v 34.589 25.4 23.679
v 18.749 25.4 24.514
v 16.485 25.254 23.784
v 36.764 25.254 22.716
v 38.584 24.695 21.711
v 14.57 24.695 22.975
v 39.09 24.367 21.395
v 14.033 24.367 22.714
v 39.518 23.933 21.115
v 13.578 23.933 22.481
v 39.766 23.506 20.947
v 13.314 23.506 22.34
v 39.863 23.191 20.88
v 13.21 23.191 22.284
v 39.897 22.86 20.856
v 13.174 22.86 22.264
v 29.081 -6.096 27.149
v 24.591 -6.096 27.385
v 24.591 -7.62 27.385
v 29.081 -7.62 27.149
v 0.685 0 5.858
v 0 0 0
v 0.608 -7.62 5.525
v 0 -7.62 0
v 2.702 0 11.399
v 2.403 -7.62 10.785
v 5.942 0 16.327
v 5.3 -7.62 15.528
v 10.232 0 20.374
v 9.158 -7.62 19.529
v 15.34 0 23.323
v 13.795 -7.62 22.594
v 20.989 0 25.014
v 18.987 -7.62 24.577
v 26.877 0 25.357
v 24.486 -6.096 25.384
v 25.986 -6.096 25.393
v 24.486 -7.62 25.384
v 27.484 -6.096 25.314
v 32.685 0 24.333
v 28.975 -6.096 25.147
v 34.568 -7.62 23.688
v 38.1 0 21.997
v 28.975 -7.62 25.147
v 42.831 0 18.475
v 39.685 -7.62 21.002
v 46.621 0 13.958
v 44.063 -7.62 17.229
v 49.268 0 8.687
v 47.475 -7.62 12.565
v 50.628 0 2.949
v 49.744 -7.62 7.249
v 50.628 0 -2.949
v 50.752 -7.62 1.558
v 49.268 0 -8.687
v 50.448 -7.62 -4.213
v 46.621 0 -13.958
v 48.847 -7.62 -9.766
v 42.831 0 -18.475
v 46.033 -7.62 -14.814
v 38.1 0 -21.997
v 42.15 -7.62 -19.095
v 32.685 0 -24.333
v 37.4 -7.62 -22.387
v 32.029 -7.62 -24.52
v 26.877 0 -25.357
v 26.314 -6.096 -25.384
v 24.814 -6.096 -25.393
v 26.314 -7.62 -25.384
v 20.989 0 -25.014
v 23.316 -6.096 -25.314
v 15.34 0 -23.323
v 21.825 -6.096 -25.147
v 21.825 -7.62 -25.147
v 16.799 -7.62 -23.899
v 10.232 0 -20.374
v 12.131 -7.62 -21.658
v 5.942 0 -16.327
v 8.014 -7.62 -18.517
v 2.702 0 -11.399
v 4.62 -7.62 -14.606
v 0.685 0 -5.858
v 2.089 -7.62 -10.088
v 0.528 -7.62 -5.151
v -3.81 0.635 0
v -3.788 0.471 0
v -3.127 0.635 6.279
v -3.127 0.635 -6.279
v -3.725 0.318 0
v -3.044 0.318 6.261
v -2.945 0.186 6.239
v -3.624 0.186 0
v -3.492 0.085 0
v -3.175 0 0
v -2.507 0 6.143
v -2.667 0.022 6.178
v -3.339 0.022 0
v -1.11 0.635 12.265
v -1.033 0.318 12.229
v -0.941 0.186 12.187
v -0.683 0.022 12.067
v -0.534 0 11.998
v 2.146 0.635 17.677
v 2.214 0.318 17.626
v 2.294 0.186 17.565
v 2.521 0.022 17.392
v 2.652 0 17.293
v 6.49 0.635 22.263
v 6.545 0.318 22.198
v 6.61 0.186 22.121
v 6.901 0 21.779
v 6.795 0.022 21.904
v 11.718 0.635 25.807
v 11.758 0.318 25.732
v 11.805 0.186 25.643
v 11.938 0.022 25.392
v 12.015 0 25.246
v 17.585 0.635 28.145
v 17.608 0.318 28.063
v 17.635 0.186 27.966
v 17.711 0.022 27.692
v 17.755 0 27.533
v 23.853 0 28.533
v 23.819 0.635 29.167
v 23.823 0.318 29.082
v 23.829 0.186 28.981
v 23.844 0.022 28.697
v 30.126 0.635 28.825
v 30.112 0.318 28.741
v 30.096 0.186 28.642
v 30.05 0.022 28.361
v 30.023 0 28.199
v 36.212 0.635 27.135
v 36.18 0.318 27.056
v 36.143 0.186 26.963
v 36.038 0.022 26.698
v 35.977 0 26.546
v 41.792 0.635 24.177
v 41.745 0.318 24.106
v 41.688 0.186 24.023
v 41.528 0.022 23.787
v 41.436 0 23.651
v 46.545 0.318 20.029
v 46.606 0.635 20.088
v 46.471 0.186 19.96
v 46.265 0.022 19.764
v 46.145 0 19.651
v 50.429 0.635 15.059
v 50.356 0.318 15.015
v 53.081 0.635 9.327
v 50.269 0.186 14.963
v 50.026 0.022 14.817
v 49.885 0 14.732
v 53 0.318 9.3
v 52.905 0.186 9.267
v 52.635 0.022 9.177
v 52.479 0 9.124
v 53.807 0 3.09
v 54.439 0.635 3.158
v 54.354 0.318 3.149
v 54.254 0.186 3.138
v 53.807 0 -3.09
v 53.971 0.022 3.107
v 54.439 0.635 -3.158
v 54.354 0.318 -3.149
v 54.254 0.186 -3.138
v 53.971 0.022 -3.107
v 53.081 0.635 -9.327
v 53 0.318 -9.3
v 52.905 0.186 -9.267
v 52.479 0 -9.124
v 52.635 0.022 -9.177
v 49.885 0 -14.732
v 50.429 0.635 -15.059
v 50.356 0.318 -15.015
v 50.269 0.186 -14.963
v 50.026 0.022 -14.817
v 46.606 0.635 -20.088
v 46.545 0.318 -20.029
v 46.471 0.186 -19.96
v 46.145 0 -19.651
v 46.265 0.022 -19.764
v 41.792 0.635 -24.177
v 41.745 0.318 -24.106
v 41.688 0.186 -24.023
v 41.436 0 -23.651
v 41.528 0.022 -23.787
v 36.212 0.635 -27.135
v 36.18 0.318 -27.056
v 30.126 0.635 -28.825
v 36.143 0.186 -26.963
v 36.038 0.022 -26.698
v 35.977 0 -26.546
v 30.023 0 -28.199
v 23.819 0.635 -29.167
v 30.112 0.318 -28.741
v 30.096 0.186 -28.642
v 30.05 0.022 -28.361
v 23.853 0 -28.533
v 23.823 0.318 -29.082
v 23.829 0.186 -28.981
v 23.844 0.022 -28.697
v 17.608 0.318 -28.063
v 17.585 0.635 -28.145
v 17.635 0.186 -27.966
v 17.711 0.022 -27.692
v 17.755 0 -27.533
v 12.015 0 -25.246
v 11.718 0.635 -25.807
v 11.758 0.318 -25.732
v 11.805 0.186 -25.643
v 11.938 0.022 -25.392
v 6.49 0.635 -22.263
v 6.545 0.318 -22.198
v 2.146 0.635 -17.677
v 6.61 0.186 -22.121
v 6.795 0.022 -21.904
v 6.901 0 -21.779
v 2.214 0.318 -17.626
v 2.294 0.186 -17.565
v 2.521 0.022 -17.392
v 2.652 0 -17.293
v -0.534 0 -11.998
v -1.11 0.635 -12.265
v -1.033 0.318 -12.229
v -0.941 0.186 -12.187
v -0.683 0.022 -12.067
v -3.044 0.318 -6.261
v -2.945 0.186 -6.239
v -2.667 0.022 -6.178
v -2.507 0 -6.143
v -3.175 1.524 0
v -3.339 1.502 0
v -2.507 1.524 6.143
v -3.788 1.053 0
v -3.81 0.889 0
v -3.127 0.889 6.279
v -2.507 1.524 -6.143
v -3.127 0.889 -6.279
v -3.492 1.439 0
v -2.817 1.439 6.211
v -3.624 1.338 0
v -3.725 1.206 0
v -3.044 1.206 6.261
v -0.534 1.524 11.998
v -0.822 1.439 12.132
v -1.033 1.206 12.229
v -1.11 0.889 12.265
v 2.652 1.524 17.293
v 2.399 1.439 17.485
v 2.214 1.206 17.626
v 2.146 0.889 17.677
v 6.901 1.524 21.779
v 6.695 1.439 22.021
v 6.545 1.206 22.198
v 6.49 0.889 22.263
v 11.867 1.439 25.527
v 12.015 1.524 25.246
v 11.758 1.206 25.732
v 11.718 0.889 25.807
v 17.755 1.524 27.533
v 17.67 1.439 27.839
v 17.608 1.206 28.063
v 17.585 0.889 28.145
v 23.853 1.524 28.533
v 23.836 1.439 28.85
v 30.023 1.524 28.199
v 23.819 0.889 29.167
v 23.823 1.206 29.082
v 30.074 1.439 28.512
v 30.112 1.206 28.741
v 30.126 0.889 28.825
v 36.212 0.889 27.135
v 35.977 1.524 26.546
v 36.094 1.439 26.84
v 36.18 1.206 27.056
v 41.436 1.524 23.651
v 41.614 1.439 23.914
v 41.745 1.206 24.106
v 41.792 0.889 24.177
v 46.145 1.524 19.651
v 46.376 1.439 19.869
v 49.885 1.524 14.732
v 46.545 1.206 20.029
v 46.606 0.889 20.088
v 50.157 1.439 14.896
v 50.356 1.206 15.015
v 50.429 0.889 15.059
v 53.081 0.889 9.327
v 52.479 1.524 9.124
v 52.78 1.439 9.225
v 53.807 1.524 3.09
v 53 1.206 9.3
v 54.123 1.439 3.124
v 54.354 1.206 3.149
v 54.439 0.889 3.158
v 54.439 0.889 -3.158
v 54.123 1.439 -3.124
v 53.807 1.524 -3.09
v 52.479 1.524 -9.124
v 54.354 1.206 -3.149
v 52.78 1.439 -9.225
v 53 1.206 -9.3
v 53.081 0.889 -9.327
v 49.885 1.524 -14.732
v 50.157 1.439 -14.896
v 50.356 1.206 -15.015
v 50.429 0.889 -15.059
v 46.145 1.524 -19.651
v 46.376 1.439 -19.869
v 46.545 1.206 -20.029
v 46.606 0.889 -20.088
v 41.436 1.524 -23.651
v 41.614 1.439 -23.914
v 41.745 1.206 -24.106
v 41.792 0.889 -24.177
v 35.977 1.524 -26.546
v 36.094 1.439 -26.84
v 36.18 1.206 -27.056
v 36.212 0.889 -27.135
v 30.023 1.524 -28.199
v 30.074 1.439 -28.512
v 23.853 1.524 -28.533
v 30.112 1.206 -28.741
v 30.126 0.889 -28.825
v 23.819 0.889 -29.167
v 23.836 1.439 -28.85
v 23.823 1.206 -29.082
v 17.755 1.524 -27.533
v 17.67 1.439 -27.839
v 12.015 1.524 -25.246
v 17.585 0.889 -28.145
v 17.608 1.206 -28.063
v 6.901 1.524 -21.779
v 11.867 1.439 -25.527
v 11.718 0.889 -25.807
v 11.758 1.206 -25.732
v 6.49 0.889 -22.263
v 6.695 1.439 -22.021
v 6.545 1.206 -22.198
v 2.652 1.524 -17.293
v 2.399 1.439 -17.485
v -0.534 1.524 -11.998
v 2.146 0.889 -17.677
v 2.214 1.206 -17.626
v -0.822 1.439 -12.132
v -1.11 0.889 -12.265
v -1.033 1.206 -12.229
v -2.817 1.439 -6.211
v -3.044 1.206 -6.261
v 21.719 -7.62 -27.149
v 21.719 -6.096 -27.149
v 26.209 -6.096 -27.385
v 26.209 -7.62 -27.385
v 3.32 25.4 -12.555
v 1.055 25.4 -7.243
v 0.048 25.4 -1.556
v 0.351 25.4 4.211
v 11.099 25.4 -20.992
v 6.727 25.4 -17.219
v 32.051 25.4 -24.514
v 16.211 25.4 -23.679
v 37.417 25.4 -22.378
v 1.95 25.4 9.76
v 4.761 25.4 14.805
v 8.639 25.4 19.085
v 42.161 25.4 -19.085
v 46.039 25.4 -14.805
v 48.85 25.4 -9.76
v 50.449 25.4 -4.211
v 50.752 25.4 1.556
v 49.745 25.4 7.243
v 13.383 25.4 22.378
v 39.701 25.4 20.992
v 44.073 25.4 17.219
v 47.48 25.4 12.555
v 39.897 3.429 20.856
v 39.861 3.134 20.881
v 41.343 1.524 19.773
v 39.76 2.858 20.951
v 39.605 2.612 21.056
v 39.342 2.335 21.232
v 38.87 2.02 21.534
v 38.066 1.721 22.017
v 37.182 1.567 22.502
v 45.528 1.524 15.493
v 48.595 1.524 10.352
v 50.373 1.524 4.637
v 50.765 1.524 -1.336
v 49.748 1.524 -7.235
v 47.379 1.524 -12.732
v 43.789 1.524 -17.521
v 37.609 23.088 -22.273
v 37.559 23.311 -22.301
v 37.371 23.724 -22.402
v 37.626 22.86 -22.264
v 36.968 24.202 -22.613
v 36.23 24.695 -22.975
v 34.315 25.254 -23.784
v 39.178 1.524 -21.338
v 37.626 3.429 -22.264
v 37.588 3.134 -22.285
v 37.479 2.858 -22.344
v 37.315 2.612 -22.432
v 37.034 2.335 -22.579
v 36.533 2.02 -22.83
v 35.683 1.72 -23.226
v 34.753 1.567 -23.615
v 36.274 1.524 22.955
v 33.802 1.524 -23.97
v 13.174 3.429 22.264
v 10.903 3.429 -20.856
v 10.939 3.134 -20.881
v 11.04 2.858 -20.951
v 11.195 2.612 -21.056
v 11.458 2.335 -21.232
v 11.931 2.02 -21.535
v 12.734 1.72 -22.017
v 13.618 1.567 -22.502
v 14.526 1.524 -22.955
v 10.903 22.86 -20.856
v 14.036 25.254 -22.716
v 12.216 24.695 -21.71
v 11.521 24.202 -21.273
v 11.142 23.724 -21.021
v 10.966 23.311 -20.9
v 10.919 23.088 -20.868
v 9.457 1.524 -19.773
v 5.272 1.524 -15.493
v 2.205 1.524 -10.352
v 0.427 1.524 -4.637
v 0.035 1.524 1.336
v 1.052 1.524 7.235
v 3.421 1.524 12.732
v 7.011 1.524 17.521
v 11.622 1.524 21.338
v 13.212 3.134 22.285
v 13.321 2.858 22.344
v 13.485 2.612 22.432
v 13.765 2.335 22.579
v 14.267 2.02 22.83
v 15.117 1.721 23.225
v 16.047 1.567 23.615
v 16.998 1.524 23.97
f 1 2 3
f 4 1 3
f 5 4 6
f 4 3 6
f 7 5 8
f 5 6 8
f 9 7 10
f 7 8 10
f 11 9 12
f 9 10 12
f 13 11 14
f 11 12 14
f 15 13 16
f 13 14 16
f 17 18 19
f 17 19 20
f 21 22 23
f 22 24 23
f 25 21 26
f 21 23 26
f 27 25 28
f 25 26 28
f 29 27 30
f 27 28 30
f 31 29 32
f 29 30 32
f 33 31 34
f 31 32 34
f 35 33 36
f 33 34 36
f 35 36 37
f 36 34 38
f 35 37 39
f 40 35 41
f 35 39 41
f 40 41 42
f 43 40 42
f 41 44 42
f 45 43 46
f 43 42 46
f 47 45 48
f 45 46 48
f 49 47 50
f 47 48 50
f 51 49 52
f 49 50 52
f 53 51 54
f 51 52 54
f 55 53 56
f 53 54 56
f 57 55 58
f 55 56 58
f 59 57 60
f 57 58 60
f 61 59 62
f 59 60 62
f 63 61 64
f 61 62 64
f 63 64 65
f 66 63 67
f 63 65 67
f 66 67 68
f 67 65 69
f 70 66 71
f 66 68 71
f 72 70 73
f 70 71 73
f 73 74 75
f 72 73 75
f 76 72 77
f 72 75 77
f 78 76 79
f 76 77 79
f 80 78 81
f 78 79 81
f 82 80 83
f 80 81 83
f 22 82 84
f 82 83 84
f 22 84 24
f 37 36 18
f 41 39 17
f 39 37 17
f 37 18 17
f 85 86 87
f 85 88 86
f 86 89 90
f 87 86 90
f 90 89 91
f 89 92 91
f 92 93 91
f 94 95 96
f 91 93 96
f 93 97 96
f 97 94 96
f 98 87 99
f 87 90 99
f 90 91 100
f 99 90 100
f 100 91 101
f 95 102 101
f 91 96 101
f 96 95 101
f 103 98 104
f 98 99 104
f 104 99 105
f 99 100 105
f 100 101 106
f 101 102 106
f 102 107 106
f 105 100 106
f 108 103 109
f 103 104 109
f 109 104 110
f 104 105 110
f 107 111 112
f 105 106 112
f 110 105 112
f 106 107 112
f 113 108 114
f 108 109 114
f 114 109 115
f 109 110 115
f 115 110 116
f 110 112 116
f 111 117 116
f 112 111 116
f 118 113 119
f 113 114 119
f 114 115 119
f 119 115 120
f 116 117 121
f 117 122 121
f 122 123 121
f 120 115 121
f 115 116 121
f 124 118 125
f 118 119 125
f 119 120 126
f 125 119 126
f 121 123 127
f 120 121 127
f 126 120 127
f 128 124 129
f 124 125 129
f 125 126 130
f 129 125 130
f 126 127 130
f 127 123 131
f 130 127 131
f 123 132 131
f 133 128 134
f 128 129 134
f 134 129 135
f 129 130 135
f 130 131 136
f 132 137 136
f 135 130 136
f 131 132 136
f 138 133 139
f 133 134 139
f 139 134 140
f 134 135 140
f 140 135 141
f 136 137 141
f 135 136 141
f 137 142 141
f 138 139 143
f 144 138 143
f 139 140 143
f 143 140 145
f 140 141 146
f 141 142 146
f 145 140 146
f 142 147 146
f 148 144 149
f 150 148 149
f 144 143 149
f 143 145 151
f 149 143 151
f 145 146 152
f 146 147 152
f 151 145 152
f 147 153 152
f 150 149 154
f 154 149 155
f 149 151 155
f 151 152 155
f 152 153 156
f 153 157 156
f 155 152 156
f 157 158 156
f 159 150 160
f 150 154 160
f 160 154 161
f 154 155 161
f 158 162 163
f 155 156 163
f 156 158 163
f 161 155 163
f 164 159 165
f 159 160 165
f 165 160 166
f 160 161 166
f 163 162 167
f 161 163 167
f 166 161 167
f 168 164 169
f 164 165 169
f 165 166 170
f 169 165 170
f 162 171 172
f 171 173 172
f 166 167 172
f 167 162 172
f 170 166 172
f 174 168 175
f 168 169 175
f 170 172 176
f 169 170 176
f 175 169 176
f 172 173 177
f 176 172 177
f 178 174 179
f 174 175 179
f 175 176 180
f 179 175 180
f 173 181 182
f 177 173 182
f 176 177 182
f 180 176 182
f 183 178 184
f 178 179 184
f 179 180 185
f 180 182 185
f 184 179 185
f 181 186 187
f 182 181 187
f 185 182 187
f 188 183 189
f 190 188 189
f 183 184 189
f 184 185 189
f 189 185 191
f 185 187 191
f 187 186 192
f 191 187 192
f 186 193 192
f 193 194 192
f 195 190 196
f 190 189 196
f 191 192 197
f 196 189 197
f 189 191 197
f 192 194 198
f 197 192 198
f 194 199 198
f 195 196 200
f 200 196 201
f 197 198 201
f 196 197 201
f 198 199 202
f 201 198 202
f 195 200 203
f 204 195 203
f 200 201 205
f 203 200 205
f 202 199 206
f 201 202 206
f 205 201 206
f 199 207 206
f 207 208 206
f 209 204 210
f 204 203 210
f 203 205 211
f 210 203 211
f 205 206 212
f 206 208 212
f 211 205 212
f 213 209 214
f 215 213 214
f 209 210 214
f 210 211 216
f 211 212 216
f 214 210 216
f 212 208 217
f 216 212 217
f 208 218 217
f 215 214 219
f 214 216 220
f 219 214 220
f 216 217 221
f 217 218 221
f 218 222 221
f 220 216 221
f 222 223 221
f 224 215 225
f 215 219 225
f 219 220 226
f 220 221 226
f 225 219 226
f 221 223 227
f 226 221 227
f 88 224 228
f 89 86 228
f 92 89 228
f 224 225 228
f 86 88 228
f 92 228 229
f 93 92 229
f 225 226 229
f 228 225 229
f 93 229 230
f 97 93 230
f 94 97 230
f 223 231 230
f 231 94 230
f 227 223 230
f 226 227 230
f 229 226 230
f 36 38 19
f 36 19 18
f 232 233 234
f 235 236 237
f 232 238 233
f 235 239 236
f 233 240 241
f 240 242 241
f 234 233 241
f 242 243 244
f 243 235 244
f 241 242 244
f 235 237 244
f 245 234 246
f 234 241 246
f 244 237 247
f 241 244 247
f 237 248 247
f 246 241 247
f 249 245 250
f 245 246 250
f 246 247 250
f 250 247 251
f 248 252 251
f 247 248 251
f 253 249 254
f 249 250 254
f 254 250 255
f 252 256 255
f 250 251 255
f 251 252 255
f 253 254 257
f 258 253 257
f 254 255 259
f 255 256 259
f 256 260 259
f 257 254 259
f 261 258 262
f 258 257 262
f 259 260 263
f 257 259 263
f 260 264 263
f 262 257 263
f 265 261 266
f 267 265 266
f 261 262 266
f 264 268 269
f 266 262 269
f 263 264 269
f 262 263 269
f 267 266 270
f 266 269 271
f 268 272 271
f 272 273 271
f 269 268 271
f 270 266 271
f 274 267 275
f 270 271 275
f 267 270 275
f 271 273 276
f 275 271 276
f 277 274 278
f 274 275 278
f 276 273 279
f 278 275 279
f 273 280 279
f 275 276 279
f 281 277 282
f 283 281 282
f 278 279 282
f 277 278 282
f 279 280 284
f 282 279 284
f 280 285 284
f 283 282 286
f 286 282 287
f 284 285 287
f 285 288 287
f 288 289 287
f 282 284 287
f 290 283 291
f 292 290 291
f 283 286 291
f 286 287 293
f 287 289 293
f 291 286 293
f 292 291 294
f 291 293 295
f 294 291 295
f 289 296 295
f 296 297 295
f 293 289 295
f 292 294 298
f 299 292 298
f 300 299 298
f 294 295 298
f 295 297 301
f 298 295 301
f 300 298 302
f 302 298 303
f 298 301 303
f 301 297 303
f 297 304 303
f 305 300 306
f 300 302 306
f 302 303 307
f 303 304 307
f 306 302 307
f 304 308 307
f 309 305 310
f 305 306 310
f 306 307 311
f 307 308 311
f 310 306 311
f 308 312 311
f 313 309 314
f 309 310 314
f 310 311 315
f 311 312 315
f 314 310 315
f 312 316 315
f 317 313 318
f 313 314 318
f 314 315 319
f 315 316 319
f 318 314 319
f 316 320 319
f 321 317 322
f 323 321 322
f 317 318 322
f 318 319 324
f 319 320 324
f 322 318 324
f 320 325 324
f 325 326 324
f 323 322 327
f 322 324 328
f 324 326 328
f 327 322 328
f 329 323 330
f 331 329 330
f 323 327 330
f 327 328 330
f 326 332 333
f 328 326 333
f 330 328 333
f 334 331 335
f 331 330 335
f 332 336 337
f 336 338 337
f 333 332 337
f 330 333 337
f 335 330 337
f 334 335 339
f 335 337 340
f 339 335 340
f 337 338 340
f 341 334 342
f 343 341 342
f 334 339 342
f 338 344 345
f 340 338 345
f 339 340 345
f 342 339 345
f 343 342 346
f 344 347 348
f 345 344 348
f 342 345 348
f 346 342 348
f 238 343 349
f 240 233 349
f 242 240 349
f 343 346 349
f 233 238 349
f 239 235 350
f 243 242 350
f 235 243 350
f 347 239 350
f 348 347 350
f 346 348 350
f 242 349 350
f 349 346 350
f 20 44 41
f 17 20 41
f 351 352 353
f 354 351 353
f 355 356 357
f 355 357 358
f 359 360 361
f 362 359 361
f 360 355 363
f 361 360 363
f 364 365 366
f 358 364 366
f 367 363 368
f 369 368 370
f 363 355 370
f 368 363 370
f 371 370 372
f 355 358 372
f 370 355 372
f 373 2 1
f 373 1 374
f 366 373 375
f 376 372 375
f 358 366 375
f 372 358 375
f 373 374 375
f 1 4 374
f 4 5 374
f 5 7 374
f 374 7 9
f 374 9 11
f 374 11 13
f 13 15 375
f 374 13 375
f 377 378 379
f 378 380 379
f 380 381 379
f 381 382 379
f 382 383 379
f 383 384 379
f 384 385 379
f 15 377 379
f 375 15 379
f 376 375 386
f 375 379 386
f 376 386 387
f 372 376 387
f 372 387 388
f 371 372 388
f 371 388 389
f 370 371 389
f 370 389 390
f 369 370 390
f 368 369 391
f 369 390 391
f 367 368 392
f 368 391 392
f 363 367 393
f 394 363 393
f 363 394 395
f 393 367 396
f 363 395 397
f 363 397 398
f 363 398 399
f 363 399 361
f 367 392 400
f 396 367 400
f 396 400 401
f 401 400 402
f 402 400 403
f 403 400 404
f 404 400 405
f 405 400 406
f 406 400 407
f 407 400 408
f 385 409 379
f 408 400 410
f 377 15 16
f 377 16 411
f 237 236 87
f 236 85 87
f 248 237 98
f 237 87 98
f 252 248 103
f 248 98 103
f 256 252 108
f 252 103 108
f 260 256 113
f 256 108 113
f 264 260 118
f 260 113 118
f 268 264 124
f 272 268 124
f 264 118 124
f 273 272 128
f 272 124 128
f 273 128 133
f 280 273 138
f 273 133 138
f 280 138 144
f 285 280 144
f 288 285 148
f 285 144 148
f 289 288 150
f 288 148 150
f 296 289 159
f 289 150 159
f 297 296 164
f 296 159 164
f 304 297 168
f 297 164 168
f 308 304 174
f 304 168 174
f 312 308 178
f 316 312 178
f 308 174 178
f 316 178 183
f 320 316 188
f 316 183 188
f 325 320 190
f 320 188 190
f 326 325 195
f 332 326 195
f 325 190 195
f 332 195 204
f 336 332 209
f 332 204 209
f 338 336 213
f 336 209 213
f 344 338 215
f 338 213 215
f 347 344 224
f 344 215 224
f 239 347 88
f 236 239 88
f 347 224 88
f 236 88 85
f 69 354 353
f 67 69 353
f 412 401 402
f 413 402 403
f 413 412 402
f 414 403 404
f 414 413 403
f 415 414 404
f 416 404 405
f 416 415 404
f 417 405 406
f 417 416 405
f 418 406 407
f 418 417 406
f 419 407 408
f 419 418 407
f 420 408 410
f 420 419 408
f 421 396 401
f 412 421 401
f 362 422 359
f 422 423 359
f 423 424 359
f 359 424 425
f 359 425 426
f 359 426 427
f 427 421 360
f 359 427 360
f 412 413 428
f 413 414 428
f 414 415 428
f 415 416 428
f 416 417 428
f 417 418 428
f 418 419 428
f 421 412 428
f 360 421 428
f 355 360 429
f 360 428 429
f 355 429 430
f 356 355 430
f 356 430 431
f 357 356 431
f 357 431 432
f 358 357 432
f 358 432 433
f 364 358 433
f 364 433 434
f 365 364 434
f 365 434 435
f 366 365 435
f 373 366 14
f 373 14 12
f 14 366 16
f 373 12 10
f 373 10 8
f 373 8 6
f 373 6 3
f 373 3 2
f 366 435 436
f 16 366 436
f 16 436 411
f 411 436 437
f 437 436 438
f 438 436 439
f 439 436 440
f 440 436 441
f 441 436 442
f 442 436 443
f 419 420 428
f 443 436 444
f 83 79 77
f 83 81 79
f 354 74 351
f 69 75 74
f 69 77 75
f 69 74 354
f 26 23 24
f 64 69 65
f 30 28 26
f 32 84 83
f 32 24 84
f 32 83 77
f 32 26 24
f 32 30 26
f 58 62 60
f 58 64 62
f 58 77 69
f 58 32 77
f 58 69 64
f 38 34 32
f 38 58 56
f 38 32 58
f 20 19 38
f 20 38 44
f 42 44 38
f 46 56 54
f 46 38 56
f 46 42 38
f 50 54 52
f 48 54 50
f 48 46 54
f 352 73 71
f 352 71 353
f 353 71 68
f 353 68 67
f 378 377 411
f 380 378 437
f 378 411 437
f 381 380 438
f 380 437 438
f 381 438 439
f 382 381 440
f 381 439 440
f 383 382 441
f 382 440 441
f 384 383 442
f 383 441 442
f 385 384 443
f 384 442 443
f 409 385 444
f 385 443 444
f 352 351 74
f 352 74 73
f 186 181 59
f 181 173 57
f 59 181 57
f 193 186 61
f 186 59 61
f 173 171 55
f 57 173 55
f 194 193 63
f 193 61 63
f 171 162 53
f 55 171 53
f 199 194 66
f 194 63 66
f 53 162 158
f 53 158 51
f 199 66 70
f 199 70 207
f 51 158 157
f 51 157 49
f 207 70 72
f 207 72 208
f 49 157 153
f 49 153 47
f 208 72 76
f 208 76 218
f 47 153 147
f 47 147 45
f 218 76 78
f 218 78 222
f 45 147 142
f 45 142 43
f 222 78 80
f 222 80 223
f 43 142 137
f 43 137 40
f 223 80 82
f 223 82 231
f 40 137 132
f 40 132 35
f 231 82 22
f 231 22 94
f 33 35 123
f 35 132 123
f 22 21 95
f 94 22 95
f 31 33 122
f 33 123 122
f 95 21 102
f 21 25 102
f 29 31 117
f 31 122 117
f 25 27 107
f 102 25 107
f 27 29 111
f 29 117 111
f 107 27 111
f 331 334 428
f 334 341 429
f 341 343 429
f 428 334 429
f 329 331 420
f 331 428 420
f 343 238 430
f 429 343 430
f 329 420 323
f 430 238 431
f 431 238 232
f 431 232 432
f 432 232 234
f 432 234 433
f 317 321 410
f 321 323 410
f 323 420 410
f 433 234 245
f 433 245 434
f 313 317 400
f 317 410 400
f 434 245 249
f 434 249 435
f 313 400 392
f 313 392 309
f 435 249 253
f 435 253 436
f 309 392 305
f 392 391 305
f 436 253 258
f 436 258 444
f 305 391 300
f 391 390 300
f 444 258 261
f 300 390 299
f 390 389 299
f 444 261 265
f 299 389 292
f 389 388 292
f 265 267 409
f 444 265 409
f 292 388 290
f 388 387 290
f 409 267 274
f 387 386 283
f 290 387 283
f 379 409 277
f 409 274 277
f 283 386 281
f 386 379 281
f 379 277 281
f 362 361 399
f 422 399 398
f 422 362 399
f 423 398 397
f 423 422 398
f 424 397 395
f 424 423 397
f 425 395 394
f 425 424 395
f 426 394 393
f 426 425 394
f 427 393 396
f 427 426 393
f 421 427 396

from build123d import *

# Parameters (mm, degrees)
CUT_EXTRUDE1_DEPTH       = 57.404
SKETCH5_W                = 4.4958
SKETCH5_H                = 1.524
BOSS_EXTRUDE1_DEPTH      = 1.905
BOSS_EXTRUDE1_DEPTH_BACK = 52.705


with BuildPart() as part:
    # Sketch1 → Revolve2 (revolve)
    with BuildSketch(Plane.XY):
        with BuildLine():
            Line((0, 25.4), (0, 1.524))
            Line((0, 1.524), (-3.175, 1.524))
            ThreePointArc((-3.175, 1.524), (-3.624012806, 1.338012806), (-3.81, 0.889))
            Line((-3.81, 0.889), (-3.81, 0.635))
            ThreePointArc((-3.81, 0.635), (-3.624012806, 0.185987194), (-3.175, 0))
            Line((-3.175, 0), (0, 0))
            Line((0, 0), (0, -7.62))
            Line((0, -7.62), (25.4, -7.62))
            Line((25.4, -7.62), (25.4, 25.4))
            Line((25.4, 25.4), (0, 25.4))
        make_face()
    revolve(axis=Axis((25.4, -7.62, 0), (0, 1, 0)))

    # Sketch4 → Cut-Extrude1 (cut)
    with BuildSketch(Plane(origin=(0.035154624, -7.62, 1.335896343), x_dir=(0.052594344, 0, 0.99861596), z_dir=(-0.99861596, 0, 0.052594344))):
        with BuildLine():
            Line((-23.495, 9.144), (-26.67, 9.144))
            Line((-26.67, 9.144), (-26.67, 33.02))
            Line((-26.67, 33.02), (-24.13, 33.02))
            ThreePointArc((-24.13, 33.02), (-22.333948776, 32.276051224), (-21.59, 30.48))
            Line((-21.59, 30.48), (-21.59, 11.049))
            ThreePointArc((-21.59, 11.049), (-22.147961582, 9.701961582), (-23.495, 9.144))
        make_face()
        with BuildLine():
            Line((21.59, 30.48), (21.59, 11.049))
            ThreePointArc((21.59, 11.049), (22.147961582, 9.701961582), (23.495, 9.144))
            Line((23.495, 9.144), (26.67, 9.144))
            Line((26.67, 9.144), (26.67, 33.02))
            Line((26.67, 33.02), (24.13, 33.02))
            ThreePointArc((24.13, 33.02), (22.333948776, 32.276051224), (21.59, 30.48))
        make_face()
    extrude(amount=-CUT_EXTRUDE1_DEPTH, mode=Mode.SUBTRACT)

    # Sketch5 → Boss-Extrude1 (add, two sides)
    with BuildSketch(Plane(origin=(26.735896343, 0, 25.364845376), x_dir=(0.99861596, 0, -0.052594344), z_dir=(0.052594344, 0, 0.99861596))) as boss_extrude1_sk:
        with Locations((0, -6.858)):
            Rectangle(SKETCH5_W, SKETCH5_H)
    extrude(amount=BOSS_EXTRUDE1_DEPTH)
    extrude(boss_extrude1_sk.sketch, amount=-BOSS_EXTRUDE1_DEPTH_BACK)


solid = part.part
